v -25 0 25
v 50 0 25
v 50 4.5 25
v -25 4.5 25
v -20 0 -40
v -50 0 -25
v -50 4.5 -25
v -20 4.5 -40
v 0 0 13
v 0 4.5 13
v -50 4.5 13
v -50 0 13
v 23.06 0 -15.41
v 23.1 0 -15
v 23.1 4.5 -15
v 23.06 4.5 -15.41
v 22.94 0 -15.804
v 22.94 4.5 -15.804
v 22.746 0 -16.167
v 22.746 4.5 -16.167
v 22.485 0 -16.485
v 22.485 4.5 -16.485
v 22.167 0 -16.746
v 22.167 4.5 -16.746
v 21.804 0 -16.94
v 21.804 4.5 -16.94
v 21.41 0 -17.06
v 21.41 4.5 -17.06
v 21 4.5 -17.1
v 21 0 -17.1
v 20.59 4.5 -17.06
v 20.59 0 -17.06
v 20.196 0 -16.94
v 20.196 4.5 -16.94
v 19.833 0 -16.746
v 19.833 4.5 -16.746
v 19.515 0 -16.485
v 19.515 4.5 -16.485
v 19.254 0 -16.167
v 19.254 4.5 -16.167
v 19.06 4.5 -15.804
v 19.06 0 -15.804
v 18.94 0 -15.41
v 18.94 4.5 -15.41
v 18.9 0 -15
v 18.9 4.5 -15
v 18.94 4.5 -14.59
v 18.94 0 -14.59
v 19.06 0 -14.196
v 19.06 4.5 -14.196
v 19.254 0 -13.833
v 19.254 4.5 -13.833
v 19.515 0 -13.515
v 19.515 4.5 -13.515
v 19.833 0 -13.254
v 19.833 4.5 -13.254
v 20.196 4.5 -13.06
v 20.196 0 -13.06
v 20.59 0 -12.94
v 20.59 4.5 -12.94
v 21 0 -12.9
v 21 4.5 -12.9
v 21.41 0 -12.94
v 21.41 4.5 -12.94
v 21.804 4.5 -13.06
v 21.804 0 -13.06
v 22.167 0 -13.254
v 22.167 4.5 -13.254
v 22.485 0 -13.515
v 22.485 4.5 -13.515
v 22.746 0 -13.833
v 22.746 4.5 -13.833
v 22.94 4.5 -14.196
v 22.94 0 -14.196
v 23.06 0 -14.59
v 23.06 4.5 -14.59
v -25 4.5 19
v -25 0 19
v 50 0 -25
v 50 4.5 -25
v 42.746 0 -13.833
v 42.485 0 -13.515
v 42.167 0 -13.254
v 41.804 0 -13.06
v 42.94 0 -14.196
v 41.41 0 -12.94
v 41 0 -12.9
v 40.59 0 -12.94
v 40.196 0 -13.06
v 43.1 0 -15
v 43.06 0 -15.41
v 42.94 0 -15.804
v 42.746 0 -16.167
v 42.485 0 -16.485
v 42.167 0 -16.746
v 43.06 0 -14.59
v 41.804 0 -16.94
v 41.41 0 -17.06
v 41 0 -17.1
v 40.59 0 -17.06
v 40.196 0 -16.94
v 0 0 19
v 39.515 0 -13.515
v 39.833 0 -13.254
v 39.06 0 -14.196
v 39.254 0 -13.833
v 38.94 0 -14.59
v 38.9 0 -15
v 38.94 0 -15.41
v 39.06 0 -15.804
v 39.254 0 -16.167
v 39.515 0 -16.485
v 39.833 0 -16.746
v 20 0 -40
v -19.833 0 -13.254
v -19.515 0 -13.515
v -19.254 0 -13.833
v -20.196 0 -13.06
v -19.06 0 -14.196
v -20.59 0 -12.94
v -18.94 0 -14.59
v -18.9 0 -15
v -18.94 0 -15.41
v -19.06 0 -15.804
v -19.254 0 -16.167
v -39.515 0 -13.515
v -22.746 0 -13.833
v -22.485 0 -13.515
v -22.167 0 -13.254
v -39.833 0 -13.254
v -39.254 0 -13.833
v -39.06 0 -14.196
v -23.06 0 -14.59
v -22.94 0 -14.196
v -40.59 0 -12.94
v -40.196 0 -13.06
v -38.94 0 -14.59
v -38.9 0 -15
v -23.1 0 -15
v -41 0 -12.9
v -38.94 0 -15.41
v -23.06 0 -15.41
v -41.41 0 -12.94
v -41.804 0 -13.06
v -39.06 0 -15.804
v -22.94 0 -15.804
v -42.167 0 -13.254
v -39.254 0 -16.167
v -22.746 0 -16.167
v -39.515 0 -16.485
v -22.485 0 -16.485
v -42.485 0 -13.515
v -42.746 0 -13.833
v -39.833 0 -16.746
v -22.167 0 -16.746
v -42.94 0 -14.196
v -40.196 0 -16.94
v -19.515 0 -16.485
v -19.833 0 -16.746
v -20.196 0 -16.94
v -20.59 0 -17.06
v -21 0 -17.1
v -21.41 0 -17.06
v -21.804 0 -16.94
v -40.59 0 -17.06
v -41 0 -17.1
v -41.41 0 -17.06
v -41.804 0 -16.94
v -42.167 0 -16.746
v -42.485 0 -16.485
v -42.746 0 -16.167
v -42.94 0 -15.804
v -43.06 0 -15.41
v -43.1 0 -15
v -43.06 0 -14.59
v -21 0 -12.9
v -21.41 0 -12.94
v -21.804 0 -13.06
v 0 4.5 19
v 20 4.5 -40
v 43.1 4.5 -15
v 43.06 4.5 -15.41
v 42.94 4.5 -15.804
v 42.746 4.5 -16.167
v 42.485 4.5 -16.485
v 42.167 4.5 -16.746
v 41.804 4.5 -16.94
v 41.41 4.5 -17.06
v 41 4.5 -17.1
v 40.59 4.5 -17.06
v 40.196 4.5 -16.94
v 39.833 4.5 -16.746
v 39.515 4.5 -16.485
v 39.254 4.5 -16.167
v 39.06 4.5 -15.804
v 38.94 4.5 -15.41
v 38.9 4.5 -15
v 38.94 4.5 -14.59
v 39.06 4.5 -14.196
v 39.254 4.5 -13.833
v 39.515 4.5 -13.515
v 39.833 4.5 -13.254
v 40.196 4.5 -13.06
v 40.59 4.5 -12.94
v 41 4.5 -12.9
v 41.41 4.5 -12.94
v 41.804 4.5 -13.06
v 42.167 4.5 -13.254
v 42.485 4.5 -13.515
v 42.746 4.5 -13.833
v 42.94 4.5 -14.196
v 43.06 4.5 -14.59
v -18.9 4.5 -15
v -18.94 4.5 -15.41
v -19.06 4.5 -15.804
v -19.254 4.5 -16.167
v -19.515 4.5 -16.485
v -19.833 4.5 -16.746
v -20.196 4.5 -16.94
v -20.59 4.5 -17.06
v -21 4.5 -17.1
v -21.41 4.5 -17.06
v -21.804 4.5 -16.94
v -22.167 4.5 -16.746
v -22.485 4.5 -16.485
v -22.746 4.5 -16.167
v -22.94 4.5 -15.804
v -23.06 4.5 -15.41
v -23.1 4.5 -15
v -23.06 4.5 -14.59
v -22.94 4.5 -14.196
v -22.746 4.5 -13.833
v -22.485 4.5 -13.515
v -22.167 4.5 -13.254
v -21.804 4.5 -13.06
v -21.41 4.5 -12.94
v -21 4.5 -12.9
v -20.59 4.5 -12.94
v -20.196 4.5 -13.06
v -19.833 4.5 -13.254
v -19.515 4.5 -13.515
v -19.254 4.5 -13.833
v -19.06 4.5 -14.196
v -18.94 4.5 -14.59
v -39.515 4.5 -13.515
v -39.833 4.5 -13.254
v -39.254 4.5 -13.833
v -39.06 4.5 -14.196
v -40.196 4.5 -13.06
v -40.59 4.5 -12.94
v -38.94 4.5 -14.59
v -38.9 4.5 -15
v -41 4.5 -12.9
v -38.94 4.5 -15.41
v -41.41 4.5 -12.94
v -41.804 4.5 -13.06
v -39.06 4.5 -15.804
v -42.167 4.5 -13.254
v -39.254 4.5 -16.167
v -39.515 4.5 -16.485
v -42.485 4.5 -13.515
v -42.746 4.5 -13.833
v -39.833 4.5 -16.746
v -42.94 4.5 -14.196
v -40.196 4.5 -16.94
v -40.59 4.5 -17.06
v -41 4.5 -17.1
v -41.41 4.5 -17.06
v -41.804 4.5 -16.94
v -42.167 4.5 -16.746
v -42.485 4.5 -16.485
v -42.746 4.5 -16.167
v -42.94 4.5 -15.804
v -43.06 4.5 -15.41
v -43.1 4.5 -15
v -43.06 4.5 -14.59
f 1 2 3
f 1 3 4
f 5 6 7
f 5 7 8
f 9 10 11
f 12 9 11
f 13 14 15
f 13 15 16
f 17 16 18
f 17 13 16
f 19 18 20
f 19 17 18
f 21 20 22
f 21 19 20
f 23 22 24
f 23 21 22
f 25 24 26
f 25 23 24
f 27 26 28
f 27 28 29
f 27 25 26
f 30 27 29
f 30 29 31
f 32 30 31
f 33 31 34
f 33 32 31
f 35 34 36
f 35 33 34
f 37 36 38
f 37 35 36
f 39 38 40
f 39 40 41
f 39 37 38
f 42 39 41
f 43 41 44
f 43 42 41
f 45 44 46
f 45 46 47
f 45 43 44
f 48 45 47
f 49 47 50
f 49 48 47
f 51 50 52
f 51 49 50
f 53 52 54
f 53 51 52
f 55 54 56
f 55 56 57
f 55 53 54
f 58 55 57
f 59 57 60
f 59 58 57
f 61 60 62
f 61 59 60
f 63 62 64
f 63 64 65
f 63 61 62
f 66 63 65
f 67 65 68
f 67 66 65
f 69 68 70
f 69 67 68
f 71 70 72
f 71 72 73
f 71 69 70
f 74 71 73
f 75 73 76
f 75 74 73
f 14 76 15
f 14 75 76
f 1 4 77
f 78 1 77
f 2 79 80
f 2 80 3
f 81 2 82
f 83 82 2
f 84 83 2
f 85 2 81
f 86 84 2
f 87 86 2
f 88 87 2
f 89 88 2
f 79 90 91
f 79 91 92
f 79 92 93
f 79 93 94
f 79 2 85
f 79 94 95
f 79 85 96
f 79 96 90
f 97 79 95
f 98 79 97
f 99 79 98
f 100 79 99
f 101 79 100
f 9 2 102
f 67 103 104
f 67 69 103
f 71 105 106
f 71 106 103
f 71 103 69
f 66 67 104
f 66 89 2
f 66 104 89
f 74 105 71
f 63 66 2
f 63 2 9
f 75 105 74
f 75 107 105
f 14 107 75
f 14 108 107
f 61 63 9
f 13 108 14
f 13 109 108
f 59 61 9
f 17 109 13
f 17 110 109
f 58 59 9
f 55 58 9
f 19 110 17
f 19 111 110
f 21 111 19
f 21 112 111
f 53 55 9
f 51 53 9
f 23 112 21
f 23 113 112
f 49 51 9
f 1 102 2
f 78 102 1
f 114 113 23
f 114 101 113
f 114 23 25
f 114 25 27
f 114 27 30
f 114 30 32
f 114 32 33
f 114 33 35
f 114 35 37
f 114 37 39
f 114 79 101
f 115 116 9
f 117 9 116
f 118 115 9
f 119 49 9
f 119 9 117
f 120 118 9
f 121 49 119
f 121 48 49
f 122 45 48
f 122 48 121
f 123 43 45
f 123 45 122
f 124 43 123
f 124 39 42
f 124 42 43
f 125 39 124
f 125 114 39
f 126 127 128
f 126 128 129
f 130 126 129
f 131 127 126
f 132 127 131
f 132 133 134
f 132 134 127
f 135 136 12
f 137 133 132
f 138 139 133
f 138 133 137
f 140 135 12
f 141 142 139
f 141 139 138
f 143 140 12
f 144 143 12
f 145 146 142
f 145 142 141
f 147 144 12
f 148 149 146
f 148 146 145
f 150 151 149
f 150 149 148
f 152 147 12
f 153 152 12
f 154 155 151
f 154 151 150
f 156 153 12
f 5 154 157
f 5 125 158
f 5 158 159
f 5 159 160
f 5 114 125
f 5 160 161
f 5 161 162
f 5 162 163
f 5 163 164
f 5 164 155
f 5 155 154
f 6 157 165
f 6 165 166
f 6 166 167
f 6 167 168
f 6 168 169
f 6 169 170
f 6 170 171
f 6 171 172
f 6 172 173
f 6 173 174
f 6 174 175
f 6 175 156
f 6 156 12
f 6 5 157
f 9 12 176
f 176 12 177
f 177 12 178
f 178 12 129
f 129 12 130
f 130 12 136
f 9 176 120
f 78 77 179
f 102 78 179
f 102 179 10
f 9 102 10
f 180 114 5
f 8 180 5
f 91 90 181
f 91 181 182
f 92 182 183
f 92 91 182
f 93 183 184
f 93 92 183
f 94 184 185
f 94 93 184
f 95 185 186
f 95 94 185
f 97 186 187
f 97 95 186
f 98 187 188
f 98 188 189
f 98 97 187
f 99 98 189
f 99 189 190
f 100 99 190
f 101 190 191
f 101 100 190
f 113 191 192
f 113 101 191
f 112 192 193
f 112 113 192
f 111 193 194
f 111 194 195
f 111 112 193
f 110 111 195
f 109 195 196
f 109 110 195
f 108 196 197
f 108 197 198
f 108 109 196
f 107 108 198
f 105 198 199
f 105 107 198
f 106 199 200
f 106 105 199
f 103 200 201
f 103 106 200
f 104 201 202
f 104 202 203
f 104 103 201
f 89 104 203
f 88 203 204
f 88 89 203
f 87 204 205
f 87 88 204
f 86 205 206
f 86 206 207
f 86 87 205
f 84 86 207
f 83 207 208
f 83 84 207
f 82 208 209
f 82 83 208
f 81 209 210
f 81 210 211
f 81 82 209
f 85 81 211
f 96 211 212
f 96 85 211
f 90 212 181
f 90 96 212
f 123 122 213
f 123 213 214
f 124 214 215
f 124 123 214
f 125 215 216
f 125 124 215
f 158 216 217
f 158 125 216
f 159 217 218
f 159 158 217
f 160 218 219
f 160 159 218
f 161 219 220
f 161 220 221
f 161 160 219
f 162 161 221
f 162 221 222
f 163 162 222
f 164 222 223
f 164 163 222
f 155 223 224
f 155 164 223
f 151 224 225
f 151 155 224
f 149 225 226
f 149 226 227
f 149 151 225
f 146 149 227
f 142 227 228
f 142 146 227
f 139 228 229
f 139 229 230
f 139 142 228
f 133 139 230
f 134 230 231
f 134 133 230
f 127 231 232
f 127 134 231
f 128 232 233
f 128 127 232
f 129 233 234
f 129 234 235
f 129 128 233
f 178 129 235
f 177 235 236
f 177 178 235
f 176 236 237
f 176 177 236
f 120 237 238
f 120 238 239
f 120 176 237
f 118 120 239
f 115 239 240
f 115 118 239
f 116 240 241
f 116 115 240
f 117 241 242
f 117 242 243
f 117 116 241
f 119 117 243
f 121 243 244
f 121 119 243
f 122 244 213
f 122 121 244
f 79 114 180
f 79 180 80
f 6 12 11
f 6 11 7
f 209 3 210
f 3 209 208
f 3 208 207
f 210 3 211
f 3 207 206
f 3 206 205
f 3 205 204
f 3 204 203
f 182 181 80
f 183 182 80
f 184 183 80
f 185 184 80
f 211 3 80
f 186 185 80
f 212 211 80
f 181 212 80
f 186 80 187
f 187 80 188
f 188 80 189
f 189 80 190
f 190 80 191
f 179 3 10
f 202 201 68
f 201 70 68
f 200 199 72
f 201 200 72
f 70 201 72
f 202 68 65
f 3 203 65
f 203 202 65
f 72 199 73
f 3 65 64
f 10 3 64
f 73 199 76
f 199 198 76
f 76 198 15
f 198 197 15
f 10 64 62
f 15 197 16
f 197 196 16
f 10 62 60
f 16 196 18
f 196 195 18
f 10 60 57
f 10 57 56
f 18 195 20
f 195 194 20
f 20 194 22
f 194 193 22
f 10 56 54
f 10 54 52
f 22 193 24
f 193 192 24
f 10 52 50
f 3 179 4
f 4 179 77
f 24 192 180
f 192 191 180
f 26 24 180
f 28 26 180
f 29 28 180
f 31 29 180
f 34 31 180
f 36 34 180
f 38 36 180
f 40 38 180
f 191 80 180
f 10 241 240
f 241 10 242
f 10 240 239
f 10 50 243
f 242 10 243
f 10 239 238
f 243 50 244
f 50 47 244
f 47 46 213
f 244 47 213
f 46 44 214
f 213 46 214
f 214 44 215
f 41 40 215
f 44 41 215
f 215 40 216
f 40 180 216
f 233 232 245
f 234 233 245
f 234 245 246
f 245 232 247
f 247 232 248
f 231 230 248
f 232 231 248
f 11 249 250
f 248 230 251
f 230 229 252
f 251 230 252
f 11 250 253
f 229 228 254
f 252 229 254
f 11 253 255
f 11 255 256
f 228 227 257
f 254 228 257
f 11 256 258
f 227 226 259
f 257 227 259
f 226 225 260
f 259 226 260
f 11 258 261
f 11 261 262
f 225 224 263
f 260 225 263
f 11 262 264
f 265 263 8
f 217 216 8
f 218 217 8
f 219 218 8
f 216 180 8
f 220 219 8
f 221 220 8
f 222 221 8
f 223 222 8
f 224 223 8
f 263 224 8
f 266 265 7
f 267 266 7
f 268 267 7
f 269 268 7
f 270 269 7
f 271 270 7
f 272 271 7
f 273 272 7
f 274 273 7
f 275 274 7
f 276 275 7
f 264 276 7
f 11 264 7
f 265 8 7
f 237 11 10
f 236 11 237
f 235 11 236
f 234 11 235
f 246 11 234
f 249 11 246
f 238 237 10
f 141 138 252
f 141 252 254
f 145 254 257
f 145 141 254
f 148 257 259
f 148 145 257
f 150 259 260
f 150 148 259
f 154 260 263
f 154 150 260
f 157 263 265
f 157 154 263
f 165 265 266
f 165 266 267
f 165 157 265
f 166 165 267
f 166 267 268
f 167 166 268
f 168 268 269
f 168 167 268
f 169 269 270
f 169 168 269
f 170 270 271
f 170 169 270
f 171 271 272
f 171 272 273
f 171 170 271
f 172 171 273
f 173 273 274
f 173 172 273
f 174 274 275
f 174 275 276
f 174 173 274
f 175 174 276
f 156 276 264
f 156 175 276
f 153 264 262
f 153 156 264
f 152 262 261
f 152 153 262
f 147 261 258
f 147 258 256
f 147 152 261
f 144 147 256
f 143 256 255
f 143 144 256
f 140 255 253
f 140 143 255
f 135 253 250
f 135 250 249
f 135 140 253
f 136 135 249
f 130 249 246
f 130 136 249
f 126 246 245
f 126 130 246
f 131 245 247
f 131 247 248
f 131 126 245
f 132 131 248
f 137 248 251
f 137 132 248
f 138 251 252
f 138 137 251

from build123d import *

# Parameters (mm, degrees)
SKETCH1_R           = 2.1
BOSS_EXTRUDE1_DEPTH = 4.5
CUT_EXTRUDE1_DEPTH  = 10


with BuildPart() as part:
    # Sketch1 → Boss-Extrude1 (new body)
    with BuildSketch(Plane(origin=(0, 0, 0), x_dir=(1, 0, 0), z_dir=(0, 1, 0))):
        Polygon((20, 40), (50, 25), (50, -25), (-50, -25), (-50, 25), (-20, 40), (0, 40), align=None)
        with Locations((-41, 15)):
            Circle(SKETCH1_R, mode=Mode.SUBTRACT)
        with Locations((41, 15)):
            Circle(SKETCH1_R, mode=Mode.SUBTRACT)
        with Locations((-21, 15)):
            Circle(SKETCH1_R, mode=Mode.SUBTRACT)
        with Locations((21, 15)):
            Circle(SKETCH1_R, mode=Mode.SUBTRACT)
    extrude(amount=BOSS_EXTRUDE1_DEPTH)

    # Sketch2 → Cut-Extrude1 (cut)
    with BuildSketch(Plane(origin=(0, 4.5, 0), x_dir=(1, 0, 0), z_dir=(0, 1, 0))):
        Polygon((-50, -19), (-50, -25), (-25, -25), (-25, -19), (0, -19), (0, -13), (-50, -13), align=None)
    extrude(amount=-CUT_EXTRUDE1_DEPTH, mode=Mode.SUBTRACT)


solid = part.part
